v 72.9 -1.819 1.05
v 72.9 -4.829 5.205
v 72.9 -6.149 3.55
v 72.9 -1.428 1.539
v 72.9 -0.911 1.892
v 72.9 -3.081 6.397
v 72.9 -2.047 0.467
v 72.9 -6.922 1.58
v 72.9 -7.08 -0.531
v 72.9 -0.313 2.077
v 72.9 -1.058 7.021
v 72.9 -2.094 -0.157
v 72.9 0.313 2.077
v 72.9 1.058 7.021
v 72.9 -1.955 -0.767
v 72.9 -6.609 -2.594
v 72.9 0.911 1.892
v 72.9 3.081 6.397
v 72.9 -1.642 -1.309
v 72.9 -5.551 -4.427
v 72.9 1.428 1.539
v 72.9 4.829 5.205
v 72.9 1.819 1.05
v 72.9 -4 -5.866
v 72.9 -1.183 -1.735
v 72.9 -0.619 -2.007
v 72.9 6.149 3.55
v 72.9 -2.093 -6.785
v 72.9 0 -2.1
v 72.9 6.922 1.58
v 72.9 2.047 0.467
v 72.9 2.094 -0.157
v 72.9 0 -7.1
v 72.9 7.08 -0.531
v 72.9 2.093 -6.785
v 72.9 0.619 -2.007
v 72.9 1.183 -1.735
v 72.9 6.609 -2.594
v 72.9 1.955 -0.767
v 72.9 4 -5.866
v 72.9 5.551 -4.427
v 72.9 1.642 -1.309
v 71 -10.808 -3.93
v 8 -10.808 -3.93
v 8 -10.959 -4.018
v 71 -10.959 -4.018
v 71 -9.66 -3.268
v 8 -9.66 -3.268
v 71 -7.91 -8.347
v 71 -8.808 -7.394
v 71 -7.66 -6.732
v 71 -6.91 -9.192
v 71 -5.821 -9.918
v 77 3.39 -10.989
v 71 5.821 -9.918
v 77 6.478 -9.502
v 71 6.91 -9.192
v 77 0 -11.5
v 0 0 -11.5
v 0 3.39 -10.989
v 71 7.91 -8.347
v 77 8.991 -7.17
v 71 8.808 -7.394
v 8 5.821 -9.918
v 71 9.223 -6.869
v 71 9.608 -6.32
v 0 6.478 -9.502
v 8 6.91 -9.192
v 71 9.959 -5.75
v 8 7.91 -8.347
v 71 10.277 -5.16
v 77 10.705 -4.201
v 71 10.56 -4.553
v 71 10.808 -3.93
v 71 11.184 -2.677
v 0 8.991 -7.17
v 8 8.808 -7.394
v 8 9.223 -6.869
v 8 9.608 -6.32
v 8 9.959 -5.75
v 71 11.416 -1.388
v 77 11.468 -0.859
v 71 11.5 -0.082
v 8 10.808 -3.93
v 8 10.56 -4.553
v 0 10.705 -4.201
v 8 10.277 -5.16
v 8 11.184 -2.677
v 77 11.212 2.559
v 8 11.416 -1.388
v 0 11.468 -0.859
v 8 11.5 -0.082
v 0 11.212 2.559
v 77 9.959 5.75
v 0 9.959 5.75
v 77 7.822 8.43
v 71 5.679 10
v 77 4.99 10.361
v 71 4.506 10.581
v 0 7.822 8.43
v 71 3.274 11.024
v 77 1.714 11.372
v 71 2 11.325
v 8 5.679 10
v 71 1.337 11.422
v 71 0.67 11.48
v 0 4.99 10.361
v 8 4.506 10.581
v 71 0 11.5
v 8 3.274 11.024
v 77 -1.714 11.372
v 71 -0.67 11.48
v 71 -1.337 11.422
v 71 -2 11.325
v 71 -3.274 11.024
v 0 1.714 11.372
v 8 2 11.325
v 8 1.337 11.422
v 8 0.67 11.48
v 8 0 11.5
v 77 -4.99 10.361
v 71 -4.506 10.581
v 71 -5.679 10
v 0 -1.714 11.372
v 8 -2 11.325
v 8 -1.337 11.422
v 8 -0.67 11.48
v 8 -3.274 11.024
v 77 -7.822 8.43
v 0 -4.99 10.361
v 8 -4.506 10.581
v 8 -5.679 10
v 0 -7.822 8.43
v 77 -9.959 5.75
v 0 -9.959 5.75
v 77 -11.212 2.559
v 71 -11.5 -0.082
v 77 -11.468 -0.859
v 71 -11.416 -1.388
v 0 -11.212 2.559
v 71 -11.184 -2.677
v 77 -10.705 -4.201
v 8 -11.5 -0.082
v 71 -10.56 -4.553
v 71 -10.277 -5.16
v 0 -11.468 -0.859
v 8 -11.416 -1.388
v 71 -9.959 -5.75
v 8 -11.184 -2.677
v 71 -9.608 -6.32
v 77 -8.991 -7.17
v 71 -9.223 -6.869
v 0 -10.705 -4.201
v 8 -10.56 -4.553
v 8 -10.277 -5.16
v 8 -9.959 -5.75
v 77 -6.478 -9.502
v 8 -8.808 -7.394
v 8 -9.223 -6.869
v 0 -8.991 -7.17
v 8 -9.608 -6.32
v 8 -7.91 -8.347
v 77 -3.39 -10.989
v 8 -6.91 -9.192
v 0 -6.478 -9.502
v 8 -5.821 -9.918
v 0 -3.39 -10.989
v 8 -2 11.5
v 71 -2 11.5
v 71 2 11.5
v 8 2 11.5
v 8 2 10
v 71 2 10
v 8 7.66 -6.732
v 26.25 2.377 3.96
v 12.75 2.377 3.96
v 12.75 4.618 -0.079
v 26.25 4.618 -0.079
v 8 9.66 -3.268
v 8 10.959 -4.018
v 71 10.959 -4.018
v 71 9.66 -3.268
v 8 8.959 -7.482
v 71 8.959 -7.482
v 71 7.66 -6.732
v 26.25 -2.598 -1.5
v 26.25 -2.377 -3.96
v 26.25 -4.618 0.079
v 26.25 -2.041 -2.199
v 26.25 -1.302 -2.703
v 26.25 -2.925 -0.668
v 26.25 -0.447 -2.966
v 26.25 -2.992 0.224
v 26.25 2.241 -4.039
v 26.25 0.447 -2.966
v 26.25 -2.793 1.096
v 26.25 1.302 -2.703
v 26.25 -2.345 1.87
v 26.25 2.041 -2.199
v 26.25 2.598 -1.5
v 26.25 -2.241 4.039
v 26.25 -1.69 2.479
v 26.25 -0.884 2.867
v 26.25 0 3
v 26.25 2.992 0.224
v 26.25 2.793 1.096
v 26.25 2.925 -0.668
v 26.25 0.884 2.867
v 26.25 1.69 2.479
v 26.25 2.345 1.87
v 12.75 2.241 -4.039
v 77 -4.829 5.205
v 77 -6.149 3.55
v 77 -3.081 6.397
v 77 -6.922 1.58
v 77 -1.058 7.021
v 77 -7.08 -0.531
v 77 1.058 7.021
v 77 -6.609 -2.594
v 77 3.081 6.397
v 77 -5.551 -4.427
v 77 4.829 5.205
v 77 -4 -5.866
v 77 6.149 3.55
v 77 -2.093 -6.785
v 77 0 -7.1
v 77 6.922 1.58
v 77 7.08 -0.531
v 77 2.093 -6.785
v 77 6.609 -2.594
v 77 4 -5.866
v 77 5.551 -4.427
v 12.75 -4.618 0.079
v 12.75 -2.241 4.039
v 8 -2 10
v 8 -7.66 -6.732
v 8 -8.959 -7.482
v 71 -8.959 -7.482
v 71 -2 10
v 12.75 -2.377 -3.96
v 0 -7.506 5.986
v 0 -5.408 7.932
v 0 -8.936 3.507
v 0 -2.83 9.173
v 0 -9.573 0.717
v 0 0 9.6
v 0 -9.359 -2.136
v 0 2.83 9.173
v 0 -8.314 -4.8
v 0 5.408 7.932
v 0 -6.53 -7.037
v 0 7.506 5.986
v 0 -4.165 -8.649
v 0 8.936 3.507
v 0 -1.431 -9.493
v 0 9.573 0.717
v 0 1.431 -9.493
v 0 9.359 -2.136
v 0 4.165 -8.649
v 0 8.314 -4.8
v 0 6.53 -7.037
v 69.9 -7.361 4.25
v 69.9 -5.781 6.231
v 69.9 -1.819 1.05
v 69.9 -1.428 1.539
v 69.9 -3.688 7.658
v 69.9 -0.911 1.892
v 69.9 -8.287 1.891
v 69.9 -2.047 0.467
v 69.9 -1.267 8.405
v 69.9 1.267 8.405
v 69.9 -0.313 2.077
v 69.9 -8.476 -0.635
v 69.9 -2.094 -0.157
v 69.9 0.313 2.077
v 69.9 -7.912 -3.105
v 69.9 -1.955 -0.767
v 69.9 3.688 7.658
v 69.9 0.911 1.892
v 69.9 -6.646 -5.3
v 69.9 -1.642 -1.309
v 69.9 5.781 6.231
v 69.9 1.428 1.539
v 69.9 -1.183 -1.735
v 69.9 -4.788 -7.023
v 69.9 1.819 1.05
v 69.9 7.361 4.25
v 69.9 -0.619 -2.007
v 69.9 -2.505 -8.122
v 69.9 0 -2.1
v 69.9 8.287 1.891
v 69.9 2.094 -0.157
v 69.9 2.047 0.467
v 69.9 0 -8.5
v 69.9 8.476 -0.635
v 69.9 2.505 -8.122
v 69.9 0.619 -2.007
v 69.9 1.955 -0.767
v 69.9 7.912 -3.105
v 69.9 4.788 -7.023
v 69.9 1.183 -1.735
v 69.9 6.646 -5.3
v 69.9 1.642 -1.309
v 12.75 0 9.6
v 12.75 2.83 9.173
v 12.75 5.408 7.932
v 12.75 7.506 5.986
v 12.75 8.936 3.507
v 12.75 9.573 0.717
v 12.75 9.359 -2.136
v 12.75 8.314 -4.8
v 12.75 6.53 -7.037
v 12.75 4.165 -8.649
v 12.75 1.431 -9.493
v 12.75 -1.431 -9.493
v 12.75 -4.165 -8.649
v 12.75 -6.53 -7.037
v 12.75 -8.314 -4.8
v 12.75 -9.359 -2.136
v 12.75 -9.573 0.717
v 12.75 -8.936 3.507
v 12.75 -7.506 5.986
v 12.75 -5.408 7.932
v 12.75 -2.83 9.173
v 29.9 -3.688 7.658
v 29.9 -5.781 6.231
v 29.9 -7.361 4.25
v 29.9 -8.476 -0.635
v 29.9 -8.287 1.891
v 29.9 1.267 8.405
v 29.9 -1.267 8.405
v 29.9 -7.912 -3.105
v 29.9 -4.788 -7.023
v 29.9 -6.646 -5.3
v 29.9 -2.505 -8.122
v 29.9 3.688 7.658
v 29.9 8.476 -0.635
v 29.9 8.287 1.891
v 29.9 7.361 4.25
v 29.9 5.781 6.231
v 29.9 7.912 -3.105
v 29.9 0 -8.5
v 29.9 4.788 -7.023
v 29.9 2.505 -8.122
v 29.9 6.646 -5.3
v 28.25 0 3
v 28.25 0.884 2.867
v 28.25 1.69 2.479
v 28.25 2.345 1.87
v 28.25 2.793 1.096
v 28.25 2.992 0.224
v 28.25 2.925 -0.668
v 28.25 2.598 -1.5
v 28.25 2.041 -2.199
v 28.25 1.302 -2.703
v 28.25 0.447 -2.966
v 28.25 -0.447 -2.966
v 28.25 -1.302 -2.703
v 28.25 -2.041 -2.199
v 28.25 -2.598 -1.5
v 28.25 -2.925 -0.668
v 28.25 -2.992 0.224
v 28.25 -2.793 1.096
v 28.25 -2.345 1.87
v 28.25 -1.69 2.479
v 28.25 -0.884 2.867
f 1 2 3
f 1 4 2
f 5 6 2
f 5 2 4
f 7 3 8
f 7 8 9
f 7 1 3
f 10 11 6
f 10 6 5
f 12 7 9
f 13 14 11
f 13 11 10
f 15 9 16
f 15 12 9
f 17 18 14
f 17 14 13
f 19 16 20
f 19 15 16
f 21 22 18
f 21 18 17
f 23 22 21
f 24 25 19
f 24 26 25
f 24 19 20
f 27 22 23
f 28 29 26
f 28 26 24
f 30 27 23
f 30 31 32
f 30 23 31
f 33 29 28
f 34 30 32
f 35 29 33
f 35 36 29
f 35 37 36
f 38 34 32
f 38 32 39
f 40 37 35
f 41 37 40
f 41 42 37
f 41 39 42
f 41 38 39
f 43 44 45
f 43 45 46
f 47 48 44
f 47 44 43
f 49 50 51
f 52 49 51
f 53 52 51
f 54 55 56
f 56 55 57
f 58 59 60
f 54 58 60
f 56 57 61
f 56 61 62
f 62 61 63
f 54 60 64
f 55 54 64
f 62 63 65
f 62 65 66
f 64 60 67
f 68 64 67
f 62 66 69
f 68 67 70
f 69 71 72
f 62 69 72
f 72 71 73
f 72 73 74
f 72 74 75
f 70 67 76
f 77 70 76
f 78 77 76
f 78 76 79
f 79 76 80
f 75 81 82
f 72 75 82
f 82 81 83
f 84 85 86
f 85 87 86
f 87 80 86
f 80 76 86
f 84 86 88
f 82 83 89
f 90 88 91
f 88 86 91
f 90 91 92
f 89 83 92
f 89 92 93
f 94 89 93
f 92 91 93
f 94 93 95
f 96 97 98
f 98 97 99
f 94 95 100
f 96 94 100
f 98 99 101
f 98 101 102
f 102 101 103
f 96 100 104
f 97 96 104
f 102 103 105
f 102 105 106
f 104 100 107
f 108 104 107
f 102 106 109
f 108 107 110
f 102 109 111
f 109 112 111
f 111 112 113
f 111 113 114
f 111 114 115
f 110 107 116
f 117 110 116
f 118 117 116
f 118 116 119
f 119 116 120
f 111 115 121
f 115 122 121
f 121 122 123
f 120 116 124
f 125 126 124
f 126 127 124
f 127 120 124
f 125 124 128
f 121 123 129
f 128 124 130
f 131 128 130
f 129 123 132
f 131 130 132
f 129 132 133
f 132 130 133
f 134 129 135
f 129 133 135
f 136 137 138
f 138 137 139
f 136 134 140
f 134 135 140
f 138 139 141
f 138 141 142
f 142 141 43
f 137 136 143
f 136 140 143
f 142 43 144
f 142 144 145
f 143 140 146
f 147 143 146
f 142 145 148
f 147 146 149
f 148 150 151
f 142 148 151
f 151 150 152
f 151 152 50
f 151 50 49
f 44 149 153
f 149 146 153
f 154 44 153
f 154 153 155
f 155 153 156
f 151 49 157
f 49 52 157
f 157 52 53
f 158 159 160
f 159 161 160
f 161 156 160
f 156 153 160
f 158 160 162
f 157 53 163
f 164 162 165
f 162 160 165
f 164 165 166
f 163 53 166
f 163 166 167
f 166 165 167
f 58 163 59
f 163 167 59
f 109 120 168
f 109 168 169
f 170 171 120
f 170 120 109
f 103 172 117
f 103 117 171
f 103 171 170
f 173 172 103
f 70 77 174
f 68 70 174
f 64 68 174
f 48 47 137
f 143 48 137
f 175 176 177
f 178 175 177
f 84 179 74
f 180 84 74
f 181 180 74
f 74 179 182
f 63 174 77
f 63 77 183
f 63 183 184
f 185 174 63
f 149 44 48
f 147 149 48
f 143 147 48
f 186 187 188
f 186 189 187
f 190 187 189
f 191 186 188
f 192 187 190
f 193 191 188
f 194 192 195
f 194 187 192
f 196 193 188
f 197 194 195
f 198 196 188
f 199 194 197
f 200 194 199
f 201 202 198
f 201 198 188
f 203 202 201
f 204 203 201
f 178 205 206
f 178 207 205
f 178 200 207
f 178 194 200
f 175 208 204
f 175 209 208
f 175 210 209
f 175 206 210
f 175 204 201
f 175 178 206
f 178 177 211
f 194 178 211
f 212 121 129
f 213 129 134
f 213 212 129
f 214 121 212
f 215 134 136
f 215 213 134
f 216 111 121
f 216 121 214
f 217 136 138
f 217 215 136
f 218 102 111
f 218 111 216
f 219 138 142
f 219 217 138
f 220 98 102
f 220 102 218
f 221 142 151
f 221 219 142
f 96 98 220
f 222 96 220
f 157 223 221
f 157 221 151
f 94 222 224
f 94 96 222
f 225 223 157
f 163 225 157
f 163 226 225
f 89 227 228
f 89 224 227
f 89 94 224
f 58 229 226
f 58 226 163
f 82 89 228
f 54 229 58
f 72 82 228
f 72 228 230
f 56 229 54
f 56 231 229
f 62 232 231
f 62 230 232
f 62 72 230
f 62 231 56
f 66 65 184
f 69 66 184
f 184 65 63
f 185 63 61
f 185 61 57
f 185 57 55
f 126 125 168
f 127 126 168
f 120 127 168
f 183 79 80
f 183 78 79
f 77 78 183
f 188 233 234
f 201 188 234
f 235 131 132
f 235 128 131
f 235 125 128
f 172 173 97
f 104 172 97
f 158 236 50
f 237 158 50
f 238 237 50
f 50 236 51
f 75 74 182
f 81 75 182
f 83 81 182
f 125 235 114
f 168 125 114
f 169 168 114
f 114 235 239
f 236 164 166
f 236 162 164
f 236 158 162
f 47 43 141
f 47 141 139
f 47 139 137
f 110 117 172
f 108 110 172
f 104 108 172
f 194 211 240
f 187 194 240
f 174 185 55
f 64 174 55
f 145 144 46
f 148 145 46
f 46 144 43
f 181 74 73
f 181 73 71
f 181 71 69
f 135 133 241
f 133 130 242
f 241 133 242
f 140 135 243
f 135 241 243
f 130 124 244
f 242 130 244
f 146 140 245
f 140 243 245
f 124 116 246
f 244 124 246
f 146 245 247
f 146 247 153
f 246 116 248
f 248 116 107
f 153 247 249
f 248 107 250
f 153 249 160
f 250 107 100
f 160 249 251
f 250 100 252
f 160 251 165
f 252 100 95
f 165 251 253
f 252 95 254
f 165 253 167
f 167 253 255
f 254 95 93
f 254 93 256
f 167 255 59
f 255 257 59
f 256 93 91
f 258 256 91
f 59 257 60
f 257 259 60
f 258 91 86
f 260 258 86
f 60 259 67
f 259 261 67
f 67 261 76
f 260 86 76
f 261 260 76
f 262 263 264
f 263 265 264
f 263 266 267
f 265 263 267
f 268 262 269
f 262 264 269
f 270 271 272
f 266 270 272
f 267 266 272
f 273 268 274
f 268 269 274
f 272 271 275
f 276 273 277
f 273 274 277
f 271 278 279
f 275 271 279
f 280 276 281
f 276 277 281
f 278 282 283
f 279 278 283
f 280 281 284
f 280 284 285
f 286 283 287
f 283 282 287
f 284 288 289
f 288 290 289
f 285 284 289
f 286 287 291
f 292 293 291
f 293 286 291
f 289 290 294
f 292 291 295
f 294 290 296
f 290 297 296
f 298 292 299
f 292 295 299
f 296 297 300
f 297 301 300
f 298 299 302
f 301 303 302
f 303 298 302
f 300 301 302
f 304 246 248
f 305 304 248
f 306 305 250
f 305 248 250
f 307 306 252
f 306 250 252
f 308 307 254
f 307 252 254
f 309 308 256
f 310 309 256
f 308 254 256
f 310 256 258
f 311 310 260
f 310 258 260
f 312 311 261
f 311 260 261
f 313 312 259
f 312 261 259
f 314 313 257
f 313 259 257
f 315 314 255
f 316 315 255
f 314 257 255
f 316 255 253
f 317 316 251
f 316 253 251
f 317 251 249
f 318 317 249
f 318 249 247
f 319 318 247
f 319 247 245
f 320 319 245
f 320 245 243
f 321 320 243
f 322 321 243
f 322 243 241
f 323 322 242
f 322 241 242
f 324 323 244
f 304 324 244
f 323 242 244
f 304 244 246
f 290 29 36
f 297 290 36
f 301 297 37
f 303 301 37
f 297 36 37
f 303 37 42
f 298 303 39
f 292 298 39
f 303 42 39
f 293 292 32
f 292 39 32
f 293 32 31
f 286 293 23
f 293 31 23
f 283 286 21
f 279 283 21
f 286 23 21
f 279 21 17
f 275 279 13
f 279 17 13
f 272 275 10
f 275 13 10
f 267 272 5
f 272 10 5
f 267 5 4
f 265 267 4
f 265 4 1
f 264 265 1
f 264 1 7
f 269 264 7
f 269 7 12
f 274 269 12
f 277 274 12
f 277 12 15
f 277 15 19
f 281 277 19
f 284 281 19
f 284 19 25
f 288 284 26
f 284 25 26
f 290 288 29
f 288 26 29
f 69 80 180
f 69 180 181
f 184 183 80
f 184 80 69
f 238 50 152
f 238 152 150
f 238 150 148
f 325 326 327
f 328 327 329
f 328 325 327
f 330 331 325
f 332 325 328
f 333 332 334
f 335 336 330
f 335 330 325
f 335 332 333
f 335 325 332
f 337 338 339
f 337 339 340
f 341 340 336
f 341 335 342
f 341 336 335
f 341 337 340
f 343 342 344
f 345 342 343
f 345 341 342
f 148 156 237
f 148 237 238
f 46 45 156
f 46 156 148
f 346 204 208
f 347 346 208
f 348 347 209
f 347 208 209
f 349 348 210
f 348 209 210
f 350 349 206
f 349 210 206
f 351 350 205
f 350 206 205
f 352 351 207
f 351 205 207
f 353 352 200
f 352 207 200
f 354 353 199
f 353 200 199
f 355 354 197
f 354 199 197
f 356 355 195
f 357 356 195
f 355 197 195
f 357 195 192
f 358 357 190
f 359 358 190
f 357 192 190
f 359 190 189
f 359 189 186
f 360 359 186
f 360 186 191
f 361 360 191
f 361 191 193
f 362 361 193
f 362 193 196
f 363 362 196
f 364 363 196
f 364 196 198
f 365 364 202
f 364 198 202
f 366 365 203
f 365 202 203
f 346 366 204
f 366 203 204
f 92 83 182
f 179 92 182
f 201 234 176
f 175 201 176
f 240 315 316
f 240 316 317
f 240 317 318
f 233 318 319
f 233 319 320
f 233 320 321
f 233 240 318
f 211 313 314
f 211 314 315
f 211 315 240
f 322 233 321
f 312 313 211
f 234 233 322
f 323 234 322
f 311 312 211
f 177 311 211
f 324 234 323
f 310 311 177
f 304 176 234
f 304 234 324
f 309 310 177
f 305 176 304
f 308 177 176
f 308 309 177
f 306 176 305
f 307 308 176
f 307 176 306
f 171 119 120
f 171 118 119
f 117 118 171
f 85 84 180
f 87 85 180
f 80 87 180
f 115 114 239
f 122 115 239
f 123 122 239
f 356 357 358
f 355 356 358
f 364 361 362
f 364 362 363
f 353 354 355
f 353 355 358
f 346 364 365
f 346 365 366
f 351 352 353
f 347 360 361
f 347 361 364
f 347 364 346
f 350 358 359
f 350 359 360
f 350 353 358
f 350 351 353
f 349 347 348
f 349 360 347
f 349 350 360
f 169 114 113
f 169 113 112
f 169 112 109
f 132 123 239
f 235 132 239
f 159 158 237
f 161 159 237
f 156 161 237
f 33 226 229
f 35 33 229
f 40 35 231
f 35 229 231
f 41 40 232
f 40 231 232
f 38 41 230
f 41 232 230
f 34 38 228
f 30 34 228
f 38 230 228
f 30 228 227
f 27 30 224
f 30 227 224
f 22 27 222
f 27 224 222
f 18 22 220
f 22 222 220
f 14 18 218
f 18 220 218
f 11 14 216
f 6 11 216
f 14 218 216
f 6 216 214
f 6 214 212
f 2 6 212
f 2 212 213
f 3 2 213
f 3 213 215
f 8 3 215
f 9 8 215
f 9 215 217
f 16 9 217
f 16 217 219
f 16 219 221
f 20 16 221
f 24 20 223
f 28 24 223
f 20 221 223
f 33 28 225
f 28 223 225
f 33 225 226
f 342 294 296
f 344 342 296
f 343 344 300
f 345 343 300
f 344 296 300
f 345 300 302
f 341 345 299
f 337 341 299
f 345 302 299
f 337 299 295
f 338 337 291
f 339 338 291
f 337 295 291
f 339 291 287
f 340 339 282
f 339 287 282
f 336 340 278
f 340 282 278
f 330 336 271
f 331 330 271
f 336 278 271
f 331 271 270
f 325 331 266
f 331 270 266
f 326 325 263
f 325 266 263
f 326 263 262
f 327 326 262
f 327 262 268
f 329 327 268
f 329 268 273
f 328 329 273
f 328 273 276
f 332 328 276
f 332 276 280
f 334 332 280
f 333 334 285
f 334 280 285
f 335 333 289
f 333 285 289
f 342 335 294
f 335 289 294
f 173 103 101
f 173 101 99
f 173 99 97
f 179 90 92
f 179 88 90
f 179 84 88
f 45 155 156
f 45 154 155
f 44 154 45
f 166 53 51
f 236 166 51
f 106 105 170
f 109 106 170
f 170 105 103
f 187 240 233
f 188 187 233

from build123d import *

# Parameters (mm, degrees)
SKIZZE1_R                       = 11.5
AUFSATZ_LINEAR_AUSTRAGEN1_DEPTH = 77
SKIZZE2_R                       = 7.1
SCHNITT_LINEAR_AUSTRAGEN1_DEPTH = 4.1
SKIZZE3_R                       = 2.1
SCHNITT_LINEAR_AUSTRAGEN2_DEPTH = 3
SKIZZE4_R                       = 9.6
SCHNITT_LINEAR_AUSTRAGEN3_DEPTH = 12.75
SCHNITT_LINEAR_START            = -6
SKIZZE7_W                       = 1.5
SKIZZE7_H                       = 15
SCHNITT_LINEAR_AUSTRAGEN4_DEPTH = 63
SKIZZE8_W                       = 63
SKIZZE8_H                       = 4
AUFSATZ_LINEAR_AUSTRAGEN2_DEPTH = 1.5
SCHNITT_LINEAR_AUSTRAGEN6_DEPTH = 13.5
SKIZZE12_R                      = 3
SCHNITT_LINEAR_AUSTRAGEN7_DEPTH = 2
KREISMUSTER3_COUNT              = 3
SKIZZE13_R                      = 8.5
SCHNITT_LINEAR_AUSTRAGEN8_DEPTH = 40


with BuildPart() as part:
    # Skizze1 → Aufsatz-Linear austragen1 (new body)
    with BuildSketch(Plane(origin=(0, 0, 0), x_dir=(0, 0, -1), z_dir=(1, 0, 0))):
        Circle(SKIZZE1_R)
    extrude(amount=AUFSATZ_LINEAR_AUSTRAGEN1_DEPTH)

    # Skizze2 → Schnitt-Linear austragen1 (cut)
    with BuildSketch(Plane(origin=(77, 0, 0), x_dir=(0, 0, -1), z_dir=(1, 0, 0))):
        Circle(SKIZZE2_R)
    extrude(amount=-SCHNITT_LINEAR_AUSTRAGEN1_DEPTH, mode=Mode.SUBTRACT)

    # Skizze3 → Schnitt-Linear austragen2 (cut)
    with BuildSketch(Plane(origin=(72.9, 0, 0), x_dir=(0, 0, -1), z_dir=(1, 0, 0))):
        Circle(SKIZZE3_R)
    extrude(amount=-SCHNITT_LINEAR_AUSTRAGEN2_DEPTH, mode=Mode.SUBTRACT)

    # Skizze4 → Schnitt-Linear austragen3 (cut)
    with BuildSketch(Plane.ZY):
        Circle(SKIZZE4_R)
    extrude(amount=-SCHNITT_LINEAR_AUSTRAGEN3_DEPTH, mode=Mode.SUBTRACT)

    # Skizze7 → Schnitt-Linear austragen4 (cut)
    with BuildSketch(Plane(origin=(77, 0, 0), x_dir=(0, 0, -1), z_dir=(1, 0, 0)).offset(SCHNITT_LINEAR_START)):
        with Locations((-10.75, 0)):
            Rectangle(SKIZZE7_W, SKIZZE7_H)
    schnitt_linear_austragen4 = extrude(amount=-SCHNITT_LINEAR_AUSTRAGEN4_DEPTH, mode=Mode.SUBTRACT)

    # Skizze8 → Aufsatz-Linear austragen2 (add)
    with BuildSketch(Plane.XY.offset(10)):
        with Locations((39.5, 0)):
            Rectangle(SKIZZE8_W, SKIZZE8_H)
    aufsatz_linear_austragen2 = extrude(amount=AUFSATZ_LINEAR_AUSTRAGEN2_DEPTH)

    # Skizze10 → Schnitt-Linear austragen6 (cut)
    with BuildSketch(Plane.ZY.offset(-12.75)):
        Polygon((4.038863706, -2.240739453), (3.959969143, 2.377388845), (-0.078894563, 4.618128298), (-4.038863706, 2.240739453), (-3.959969143, -2.377388845), (0.078894563, -4.618128298), align=None)
    extrude(amount=-SCHNITT_LINEAR_AUSTRAGEN6_DEPTH, mode=Mode.SUBTRACT)

    # Skizze12 → Schnitt-Linear austragen7 (cut)
    with BuildSketch(Plane.ZY.offset(-26.25)):
        Circle(SKIZZE12_R)
    extrude(amount=-SCHNITT_LINEAR_AUSTRAGEN7_DEPTH, mode=Mode.SUBTRACT)

    # Kreismuster3: Schnitt-Linear austragen4, Aufsatz-Linear austragen2 ×3 about axis
    kreismuster3_axis = Axis((0, 0, 0), (1, 0, 0))
    add([schnitt_linear_austragen4.rotate(kreismuster3_axis, i * 360 / KREISMUSTER3_COUNT) for i in range(1, KREISMUSTER3_COUNT)], mode=Mode.SUBTRACT)
    add([aufsatz_linear_austragen2.rotate(kreismuster3_axis, i * 360 / KREISMUSTER3_COUNT) for i in range(1, KREISMUSTER3_COUNT)])

    # Skizze13 → Schnitt-Linear austragen8 (cut)
    with BuildSketch(Plane(origin=(69.9, 0, 0), x_dir=(0, 0, -1), z_dir=(1, 0, 0))):
        Circle(SKIZZE13_R)
    extrude(amount=-SCHNITT_LINEAR_AUSTRAGEN8_DEPTH, mode=Mode.SUBTRACT)


solid = part.part
